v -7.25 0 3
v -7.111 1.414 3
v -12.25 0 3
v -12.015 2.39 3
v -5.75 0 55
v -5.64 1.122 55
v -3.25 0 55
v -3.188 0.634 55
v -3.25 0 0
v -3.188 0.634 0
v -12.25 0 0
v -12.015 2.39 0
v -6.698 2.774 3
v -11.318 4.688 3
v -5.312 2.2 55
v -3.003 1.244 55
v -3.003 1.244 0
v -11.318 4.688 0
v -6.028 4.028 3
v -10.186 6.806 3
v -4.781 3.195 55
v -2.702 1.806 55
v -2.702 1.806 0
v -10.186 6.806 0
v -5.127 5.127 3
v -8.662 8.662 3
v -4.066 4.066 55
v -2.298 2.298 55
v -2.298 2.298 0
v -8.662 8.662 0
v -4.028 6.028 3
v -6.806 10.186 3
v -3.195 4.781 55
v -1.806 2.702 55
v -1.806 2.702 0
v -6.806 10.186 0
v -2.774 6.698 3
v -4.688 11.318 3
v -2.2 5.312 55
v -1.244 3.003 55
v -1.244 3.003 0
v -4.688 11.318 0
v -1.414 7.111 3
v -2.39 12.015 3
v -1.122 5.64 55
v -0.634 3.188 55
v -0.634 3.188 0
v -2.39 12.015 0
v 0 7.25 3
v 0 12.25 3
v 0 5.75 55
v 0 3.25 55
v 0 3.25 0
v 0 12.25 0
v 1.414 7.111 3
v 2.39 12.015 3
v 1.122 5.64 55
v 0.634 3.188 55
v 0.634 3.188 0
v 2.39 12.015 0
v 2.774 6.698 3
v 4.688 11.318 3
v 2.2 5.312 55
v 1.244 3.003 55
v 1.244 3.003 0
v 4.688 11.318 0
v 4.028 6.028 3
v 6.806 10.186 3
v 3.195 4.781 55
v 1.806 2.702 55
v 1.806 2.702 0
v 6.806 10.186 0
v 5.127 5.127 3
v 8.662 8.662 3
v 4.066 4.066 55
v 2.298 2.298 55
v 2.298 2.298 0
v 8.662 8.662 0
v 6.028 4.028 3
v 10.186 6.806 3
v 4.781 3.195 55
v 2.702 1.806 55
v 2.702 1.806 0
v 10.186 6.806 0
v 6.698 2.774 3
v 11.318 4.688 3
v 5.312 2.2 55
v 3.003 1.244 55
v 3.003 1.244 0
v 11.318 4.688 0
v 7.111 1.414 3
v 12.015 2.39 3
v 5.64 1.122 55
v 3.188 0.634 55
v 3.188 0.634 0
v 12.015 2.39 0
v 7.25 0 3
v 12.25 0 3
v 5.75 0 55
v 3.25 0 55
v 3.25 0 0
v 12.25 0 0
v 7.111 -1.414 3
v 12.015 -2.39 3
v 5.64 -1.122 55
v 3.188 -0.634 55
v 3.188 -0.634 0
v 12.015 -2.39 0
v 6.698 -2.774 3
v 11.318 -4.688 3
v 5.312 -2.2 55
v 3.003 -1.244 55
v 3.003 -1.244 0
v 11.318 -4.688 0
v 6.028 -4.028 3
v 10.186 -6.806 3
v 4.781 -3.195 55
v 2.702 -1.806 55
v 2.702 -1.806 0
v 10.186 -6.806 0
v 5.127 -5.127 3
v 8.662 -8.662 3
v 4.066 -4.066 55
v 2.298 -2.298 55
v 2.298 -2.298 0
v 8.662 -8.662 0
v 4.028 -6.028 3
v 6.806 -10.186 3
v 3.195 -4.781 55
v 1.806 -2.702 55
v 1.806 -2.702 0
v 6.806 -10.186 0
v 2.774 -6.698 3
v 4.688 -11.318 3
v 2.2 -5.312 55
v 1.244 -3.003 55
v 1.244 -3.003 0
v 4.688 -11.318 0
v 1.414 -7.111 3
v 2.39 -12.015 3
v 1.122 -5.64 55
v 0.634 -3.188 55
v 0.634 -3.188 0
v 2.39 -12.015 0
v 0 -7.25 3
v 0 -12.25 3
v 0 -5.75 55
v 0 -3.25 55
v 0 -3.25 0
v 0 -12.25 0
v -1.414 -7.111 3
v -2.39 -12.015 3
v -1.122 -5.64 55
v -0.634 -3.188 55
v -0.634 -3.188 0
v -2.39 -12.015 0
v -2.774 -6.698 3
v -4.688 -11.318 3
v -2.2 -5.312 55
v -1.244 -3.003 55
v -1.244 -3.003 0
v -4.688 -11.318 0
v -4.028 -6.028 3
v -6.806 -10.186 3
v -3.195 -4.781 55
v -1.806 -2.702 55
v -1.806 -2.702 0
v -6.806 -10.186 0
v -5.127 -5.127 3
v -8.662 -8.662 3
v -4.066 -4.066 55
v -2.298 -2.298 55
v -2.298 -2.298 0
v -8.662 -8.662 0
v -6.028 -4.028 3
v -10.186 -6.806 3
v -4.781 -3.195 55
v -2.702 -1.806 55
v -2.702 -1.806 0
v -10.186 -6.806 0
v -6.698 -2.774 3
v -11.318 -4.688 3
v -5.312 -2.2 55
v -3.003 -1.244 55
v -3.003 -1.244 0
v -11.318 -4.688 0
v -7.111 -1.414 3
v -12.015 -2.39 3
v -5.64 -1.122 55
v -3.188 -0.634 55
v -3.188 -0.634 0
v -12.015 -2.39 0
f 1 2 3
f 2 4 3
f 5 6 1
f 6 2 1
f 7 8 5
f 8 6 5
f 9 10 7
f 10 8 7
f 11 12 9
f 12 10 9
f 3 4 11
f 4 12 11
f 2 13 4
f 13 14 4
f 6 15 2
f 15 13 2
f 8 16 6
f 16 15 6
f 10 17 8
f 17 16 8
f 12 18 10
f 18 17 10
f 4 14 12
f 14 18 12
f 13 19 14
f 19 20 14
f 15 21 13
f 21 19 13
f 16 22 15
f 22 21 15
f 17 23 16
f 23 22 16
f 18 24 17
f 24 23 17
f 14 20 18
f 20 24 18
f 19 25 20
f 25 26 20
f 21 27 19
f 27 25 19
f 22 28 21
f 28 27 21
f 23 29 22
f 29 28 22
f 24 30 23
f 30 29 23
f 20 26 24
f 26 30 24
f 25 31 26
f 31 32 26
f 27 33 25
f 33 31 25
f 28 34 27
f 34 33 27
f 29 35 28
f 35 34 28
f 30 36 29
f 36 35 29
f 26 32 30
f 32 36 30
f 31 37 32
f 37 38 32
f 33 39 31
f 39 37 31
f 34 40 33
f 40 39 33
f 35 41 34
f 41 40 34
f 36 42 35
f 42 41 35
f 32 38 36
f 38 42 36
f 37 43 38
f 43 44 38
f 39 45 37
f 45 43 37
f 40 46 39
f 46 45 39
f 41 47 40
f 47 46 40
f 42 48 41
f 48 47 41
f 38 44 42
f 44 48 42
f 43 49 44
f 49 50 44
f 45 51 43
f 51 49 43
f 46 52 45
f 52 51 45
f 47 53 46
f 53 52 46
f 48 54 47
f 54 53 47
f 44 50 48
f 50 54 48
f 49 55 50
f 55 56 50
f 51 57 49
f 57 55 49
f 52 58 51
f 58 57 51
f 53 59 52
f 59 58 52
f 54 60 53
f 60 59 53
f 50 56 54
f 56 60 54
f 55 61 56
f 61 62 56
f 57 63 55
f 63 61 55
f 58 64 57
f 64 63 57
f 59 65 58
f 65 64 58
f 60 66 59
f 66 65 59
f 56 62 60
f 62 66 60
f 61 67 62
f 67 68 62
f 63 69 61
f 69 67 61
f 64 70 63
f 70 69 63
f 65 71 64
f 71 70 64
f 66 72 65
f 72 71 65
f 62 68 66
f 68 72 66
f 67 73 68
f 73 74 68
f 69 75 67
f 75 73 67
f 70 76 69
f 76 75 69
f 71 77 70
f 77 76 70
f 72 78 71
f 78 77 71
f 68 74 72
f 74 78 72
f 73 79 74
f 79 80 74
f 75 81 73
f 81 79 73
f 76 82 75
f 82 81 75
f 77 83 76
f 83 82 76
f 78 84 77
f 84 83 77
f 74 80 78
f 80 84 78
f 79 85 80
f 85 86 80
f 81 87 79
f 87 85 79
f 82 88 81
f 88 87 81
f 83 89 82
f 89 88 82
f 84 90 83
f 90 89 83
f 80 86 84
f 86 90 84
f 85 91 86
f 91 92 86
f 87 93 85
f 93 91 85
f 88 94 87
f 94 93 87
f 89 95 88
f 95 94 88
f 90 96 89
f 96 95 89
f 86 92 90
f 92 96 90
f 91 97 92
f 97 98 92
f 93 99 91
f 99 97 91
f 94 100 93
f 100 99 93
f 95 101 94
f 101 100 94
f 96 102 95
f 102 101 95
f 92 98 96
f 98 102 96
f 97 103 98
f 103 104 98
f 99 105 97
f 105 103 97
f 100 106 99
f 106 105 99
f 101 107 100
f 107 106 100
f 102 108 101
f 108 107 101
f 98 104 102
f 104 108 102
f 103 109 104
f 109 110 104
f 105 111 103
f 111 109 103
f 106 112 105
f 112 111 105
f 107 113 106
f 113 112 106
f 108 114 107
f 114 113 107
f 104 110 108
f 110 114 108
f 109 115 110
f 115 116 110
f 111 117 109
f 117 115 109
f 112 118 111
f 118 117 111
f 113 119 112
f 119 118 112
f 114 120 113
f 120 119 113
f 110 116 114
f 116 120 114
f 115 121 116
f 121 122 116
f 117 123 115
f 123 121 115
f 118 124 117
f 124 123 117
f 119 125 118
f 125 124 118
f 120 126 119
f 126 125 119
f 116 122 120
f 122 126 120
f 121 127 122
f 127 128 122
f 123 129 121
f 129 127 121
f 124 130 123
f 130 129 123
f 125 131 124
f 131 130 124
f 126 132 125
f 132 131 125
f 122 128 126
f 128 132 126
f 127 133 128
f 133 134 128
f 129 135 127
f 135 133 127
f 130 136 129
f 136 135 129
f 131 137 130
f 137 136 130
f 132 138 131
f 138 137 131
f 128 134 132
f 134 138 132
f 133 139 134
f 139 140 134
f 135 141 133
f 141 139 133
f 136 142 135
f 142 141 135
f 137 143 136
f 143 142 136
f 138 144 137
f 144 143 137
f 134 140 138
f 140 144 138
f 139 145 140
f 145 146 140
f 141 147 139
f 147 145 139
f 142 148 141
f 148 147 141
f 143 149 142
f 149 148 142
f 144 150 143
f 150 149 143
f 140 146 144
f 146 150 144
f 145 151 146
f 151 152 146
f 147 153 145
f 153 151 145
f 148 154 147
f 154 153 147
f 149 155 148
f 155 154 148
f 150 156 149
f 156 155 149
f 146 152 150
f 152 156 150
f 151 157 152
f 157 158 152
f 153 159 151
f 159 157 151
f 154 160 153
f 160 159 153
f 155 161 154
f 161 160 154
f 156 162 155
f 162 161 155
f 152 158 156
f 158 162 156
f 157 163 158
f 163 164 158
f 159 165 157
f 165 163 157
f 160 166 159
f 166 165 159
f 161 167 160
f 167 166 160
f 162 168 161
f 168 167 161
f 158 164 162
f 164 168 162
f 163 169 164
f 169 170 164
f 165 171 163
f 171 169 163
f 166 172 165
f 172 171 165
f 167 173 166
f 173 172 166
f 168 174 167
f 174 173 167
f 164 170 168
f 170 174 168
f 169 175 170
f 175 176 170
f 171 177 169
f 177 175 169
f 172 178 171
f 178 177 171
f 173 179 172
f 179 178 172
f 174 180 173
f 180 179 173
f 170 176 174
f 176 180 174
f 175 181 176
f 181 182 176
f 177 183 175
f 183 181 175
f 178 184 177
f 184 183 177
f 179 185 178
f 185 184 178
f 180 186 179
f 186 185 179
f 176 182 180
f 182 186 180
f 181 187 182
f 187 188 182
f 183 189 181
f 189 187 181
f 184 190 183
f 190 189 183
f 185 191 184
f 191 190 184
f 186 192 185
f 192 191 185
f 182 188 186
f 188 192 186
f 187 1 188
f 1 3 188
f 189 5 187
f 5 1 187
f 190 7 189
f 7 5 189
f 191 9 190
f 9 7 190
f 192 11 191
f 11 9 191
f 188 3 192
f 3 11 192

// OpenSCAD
$fn = 32;

// ----------------------------------------------------------------------
// Profiled standoff: conical spacer, 55 mm long, bore 6.5 mm
// ----------------------------------------------------------------------

// --- parameters (mm) ---
revolve_angle = 360;      // full turn around the Z axis
profile_points = 6;       // points of the closed outline

profile = [[3.25, 0], [12.25, 0], [12.25, 3], [7.25, 3], [5.75, 55], [3.25, 55]];  // single closed polygon, 6 points, counter clockwise

// --- the one profile operation ---
rotate_extrude(angle = revolve_angle) polygon(points = profile);
